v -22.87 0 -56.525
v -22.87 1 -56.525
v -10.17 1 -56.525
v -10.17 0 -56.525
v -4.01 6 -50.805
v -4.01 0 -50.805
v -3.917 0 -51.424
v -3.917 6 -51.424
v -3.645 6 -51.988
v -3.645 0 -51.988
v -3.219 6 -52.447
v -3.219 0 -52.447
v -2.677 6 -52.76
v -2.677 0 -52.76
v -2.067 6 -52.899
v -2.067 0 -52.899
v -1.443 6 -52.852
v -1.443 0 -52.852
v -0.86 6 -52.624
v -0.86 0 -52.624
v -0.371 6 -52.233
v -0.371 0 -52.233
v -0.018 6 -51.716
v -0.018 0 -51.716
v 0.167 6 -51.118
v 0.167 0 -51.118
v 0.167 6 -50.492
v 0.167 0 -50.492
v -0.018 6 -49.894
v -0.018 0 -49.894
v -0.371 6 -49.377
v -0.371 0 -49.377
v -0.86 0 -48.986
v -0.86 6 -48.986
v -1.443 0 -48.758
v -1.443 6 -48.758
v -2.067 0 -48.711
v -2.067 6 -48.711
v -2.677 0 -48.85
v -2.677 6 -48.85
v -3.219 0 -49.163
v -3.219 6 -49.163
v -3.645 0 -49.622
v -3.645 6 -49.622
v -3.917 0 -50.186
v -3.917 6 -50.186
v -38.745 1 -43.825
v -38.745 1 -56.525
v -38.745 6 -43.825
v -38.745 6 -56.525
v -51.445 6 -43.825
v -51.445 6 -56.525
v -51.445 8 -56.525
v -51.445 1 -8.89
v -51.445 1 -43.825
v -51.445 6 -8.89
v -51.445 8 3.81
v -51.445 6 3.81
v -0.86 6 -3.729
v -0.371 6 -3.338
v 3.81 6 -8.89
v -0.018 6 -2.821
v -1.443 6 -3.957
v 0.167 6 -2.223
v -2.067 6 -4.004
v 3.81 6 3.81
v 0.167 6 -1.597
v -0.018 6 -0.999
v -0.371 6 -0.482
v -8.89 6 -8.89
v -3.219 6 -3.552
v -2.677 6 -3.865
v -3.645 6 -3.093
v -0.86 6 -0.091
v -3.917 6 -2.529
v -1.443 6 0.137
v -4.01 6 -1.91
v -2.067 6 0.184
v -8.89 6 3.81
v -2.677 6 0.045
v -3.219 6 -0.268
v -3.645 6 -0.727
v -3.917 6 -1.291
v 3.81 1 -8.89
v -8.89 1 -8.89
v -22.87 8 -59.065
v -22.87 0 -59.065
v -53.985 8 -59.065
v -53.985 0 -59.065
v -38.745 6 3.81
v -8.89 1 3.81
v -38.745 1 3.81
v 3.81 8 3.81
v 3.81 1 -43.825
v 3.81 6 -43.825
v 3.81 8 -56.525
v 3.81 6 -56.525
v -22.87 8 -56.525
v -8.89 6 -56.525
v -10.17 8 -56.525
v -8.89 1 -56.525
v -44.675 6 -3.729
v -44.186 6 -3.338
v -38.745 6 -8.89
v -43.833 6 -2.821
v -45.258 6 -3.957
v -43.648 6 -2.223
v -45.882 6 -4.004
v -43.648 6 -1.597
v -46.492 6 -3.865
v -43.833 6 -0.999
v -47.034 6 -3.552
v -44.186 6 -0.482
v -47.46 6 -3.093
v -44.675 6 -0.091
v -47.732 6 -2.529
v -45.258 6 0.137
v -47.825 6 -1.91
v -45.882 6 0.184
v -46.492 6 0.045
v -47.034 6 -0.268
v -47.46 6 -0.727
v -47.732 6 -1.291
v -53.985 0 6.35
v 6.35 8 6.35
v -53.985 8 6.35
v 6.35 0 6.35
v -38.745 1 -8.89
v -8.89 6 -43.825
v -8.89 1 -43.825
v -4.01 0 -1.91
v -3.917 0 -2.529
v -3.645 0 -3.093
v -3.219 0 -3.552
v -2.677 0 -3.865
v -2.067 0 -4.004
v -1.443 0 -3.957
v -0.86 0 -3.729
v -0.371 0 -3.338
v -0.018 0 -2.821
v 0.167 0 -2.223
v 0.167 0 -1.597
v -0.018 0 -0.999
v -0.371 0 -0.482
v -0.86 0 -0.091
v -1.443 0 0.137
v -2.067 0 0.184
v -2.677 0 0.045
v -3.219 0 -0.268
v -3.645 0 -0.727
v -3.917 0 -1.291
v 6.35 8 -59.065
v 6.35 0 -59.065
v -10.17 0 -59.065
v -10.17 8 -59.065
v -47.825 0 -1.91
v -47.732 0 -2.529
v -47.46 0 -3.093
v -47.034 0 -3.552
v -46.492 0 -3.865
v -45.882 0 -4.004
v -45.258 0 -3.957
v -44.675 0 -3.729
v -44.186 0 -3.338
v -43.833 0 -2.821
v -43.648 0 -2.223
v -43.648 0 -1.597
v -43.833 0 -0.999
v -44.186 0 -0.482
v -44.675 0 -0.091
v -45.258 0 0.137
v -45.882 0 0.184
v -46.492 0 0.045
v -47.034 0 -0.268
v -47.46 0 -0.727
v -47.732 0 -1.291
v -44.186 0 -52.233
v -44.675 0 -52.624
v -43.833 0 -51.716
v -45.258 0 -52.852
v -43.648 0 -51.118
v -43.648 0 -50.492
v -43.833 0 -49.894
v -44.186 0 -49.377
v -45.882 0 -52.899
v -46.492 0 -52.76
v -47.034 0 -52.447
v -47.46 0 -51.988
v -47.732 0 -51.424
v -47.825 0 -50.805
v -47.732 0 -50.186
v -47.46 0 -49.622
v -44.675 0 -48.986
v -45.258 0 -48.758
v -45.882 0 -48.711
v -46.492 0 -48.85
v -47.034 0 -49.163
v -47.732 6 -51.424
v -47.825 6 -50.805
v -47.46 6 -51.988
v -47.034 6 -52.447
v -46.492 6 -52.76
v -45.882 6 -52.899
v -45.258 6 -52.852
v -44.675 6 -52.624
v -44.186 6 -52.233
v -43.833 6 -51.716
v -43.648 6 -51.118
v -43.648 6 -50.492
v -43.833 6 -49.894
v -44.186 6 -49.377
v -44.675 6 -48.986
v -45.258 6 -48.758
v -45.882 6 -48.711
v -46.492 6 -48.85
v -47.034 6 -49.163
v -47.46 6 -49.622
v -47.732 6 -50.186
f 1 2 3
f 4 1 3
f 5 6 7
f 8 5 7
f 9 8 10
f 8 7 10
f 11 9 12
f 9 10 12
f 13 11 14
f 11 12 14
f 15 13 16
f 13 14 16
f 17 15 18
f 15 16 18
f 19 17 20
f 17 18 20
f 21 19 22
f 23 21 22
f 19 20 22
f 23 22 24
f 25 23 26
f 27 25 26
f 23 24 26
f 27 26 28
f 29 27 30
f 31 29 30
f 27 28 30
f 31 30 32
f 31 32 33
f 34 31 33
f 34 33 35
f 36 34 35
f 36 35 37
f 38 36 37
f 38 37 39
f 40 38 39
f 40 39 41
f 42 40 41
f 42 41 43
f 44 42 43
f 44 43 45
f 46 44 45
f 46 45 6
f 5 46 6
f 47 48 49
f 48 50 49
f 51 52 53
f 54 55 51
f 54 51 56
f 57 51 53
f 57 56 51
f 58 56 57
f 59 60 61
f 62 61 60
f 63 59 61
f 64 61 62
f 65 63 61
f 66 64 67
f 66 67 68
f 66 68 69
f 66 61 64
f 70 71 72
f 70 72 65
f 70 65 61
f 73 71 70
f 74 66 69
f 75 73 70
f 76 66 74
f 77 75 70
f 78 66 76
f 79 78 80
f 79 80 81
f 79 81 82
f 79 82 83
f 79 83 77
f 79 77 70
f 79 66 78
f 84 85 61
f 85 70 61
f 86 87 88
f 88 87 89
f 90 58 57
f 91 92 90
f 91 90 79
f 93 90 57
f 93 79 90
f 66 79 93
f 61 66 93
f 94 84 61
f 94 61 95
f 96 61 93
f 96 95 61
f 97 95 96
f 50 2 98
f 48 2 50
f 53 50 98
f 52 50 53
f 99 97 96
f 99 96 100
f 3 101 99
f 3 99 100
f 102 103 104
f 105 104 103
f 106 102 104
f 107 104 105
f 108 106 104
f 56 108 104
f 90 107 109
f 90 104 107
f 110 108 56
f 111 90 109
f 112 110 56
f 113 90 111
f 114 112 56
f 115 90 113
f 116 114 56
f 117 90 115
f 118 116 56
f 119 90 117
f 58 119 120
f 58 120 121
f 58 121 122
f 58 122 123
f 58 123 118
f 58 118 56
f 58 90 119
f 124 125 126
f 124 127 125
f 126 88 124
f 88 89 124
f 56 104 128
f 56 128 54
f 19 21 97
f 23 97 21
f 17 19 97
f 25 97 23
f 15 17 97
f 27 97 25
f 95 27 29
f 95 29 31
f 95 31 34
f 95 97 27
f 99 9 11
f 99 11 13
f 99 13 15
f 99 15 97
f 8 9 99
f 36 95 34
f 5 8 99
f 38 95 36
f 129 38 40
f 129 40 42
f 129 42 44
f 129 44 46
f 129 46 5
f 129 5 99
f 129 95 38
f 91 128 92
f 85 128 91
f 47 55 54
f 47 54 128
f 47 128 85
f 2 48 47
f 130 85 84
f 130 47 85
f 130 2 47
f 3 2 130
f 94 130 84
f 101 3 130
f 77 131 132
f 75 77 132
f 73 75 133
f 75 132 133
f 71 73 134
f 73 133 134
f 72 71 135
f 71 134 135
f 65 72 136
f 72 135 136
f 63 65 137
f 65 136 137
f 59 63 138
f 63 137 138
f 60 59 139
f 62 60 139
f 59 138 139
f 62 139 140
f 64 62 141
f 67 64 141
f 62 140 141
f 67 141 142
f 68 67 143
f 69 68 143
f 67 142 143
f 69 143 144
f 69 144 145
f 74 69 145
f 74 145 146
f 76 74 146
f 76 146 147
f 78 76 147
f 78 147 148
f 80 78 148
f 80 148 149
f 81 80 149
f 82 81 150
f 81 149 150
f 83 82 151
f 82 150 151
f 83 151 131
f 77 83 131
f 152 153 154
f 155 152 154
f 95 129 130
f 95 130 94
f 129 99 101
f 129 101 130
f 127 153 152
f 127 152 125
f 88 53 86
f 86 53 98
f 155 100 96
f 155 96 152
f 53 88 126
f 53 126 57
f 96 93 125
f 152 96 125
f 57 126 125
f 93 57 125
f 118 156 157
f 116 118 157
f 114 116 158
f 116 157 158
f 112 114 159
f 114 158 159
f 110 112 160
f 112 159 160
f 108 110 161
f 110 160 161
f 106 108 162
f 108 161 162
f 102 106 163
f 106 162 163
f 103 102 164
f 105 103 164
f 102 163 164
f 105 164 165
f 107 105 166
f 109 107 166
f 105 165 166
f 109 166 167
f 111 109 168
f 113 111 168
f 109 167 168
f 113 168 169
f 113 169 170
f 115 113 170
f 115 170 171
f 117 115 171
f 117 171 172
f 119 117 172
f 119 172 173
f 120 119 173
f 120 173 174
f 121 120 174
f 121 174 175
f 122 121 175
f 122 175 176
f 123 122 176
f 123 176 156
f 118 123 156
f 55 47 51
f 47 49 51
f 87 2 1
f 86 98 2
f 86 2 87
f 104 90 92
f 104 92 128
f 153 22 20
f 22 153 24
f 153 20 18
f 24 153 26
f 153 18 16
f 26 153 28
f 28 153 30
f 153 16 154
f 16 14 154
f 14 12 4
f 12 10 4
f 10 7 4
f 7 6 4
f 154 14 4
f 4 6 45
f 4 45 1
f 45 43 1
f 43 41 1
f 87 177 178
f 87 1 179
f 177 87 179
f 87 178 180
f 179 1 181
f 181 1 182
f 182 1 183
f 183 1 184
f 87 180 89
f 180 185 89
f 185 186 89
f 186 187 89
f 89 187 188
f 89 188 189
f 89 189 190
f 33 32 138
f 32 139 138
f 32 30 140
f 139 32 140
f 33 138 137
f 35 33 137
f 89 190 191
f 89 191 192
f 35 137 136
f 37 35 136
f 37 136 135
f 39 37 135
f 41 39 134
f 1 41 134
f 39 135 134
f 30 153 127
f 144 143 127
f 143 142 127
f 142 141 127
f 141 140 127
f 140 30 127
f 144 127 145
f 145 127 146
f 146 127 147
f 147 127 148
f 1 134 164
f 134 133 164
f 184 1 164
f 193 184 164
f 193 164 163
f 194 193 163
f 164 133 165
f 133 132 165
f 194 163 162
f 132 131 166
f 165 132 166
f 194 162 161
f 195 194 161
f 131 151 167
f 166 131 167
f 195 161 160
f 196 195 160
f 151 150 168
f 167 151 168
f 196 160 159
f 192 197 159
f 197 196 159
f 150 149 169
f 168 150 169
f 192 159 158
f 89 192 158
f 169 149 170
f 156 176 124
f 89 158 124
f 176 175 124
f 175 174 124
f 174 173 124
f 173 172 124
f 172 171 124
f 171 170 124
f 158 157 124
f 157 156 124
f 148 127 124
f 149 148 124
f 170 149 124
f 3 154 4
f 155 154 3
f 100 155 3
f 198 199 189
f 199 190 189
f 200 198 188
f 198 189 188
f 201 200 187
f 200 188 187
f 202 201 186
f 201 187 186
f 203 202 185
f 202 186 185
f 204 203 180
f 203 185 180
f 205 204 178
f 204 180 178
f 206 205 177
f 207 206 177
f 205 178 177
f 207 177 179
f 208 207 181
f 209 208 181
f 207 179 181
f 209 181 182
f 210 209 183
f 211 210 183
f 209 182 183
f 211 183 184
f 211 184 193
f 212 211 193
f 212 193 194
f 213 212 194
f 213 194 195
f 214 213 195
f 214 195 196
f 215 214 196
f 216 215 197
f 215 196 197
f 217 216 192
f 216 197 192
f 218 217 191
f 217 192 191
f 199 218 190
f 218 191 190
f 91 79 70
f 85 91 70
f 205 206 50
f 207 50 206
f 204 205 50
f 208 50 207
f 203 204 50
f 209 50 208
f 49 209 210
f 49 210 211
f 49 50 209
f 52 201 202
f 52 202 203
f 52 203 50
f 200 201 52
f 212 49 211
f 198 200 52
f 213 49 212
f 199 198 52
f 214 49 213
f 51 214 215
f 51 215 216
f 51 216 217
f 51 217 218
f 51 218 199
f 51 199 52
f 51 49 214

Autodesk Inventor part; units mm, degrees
ref_plane "YZ Plane" through (0, 0, 0) normal (1, 0, 0) x (0, 1, 0)
ref_plane "XZ Plane" through (0, 0, 0) normal (0, 1, 0) x (-1, 0, 0)
ref_plane "XY Plane" through (0, 0, 0) normal (0, 0, 1) x (1, 0, 0)
sketch "Sketch1" plane through (0, 0, 0) normal (0, 1, 0) x (-1, 0, 0)
  line L0 (0, 0) -> (47.635, 0)
  line L1 (47.635, 0) -> (47.635, -52.715)
  line L2 (47.635, -52.715) -> (0, -52.715)
  line L3 (0, -52.715) -> (0, 0)
  circle A0 centre (45.725, -1.91) radius 2.1
  circle A1 centre (45.725, -50.805) radius 2.1
  circle A2 centre (1.91, -1.91) radius 2.1
  circle A3 centre (1.91, -50.805) radius 2.1
  line L4 (47.635, 0) -> (51.445, 0)
  line L5 (51.445, 0) -> (51.445, -52.715)
  line L6 (51.445, -52.715) -> (47.635, -52.715)
  line L7 (47.635, -52.715) -> (47.635, 0)
  line L8 (0, 0) -> (-3.81, 0)
  line L9 (-3.81, 0) -> (-3.81, -56.525)
  line L10 (-3.81, -56.525) -> (0, -56.525)
  line L11 (0, -56.525) -> (0, 0)
  line L12 (51.445, -52.715) -> (-6.35, -52.715)
  line L13 (-6.35, -52.715) -> (-6.35, -56.525)
  line L14 (-6.35, -56.525) -> (51.445, -56.525)
  line L15 (51.445, -56.525) -> (51.445, -52.715)
  line L16 (-3.81, 0) -> (51.445, 0)
  line L17 (51.445, 0) -> (51.445, 3.81)
  line L18 (51.445, 3.81) -> (-3.81, 3.81)
  line L19 (-3.81, 3.81) -> (-3.81, 0)
  point P0 (0, -52.715)
  point P1 (0, -51.6779)
  point P2 (0, -49.9321)
  point P3 (0, -2.7829)
  point P4 (0, -1.0371)
  point P5 (-3.81, -77.675)
  point P6 (-3.81, -52.715)
  point P7 (0, -52.715)
  point P8 (1.0371, -52.715)
  point P9 (2.7829, -52.715)
  point P10 (0, -52.715)
  point P11 (0, -56.525)
  point P12 (0, -56.525)
  dimension "d0" = 52.715
  dimension "d1" = 47.635
  dimension "d3" = 4.2
  dimension "d4" = 4.2
  dimension "d6" = 1.91
  dimension "d7" = 1.91
  dimension "d8" = 1.91
  dimension "d9" = 4.2
  dimension "d10" = 4.2
  dimension "d11" = 1.91
  dimension "d12" = 1.91
  dimension "d13" = 1.91
  dimension "d14" = 1.91
  dimension "d15" = 1.91
  dimension "d18" = 3.81
  dimension "d19" = 3.81
  dimension "d20" = 3.81
  dimension "d21" = 3.81
  dimension "d38" = 0
  dimension "d39" = 0
extrude "Extrusion5" add sketch "Sketch1" along normal blind 6 contours L8 L19 L18 L17 L4 L0 A0 A2 | L0 A2 L3 | L3 A2 A3 L12 L9 L8 | L0 A0 L1 A1 L2 A3 L3 A2 | L12 L11 L10 L9 | L3 A3 L2 | L2 A3 A1 L6 L15 L14 L11 | L0 L1 A0 | A0 L1 L4 L5 L6 A1 | L1 L2 A1 picked at (0.2904, -0.2904) picked at (0.2904, -52.4246) picked at (47.3446, -0.2904) picked at (47.3446, -52.4246)
sketch "Sketch6" plane through (0, 6, 0) normal (0, 1, 0) x (1, 0, 0)
  line L0 (-51.445, -3.81) -> (3.81, -3.81) projected
  line L1 (-51.445, -3.81) -> (-38.745, -3.81)
  line L2 (-38.745, -3.81) -> (-38.745, 8.89)
  line L3 (-38.745, 8.89) -> (-51.445, 8.89)
  line L4 (-51.445, 8.89) -> (-51.445, -3.81)
  line L5 (3.81, 56.525) -> (-51.445, 56.525) projected
  line L6 (-51.445, 56.525) -> (-38.745, 56.525)
  line L7 (-38.745, 56.525) -> (-38.745, 43.825)
  line L8 (-38.745, 43.825) -> (-51.445, 43.825)
  line L9 (-51.445, 43.825) -> (-51.445, 56.525)
  line L10 (3.81, -3.81) -> (3.81, 56.525) projected
  line L11 (3.81, 56.525) -> (-8.89, 56.525)
  line L12 (-8.89, 56.525) -> (-8.89, 43.825)
  line L13 (-8.89, 43.825) -> (3.81, 43.825)
  line L14 (3.81, 43.825) -> (3.81, 56.525)
  line L15 (3.81, -3.81) -> (-8.89, -3.81)
  line L16 (-8.89, -3.81) -> (-8.89, 8.89)
  line L17 (-8.89, 8.89) -> (3.81, 8.89)
  line L18 (3.81, 8.89) -> (3.81, -3.81)
  line L19 (3.81, 56.525) -> (-51.445, 56.525) projected
  line L20 (-51.445, 56.525) -> (-51.445, -3.81) projected
  line L21 (-51.445, -3.81) -> (3.81, -3.81) projected
  line L22 (3.81, -3.81) -> (3.81, 56.525) projected
  circle A0 centre (-1.91, 1.91) radius 2.1 projected
  circle A1 centre (-45.725, 1.91) radius 2.1 projected
  circle A2 centre (-45.725, 50.805) radius 2.1 projected
  circle A3 centre (-1.91, 50.805) radius 2.1 projected
  point P0 (0, 0)
  point P1 (3.81, 8.89)
  dimension "d42" = 12.7
  dimension "d43" = 12.7
  dimension "d44" = 12.7
  dimension "d45" = 12.7
  dimension "d46" = 12.7
  dimension "d47" = 12.7
extrude "Extrusion6" cut sketch "Sketch6" against normal blind 5 contours L2 L3 L20 L8 L7 L5 L12 L13 L10 L17 L16 L0
sketch "Sketch7" plane through (0, 0, 0) normal (0, -1, 0) x (1, 0, 0)
  line L0 (3.81, -56.525) -> (-51.445, -56.525) projected
  line L1 (3.81, 3.81) -> (3.81, -56.525) projected
  line L2 (-51.445, 3.81) -> (3.81, 3.81) projected
  line L3 (-51.445, -56.525) -> (-51.445, 3.81) projected
  circle A0 centre (-1.91, -1.91) radius 2.1 projected
  circle A1 centre (-45.725, -1.91) radius 2.1 projected
  circle A2 centre (-45.725, -50.805) radius 2.1 projected
  circle A3 centre (-1.91, -50.805) radius 2.1 projected
  line L4 (-8.89, 3.81) -> (3.81, 3.81) projected
  line L5 (3.81, 3.81) -> (-51.445, 3.81)
  line L6 (-51.445, 3.81) -> (-51.445, 6.35)
  line L7 (-51.445, 6.35) -> (3.81, 6.35)
  line L8 (3.81, 6.35) -> (3.81, 3.81)
  line L9 (-51.445, 6.35) -> (-53.985, 6.35)
  line L10 (-53.985, 6.35) -> (-53.985, -56.525)
  line L11 (-53.985, -56.525) -> (-51.445, -56.525)
  line L12 (-51.445, -56.525) -> (-51.445, 6.35)
  line L13 (-53.985, -56.525) -> (3.81, -56.525)
  line L14 (3.81, -56.525) -> (3.81, -59.065)
  line L15 (3.81, -59.065) -> (-53.985, -59.065)
  line L16 (-53.985, -59.065) -> (-53.985, -56.525)
  line L17 (3.81, -59.065) -> (6.35, -59.065)
  line L18 (6.35, -59.065) -> (6.35, 5.08)
  line L19 (6.35, 5.08) -> (3.81, 5.08)
  line L20 (3.81, 5.08) -> (3.81, -59.065)
  line L21 (6.35, 5.08) -> (3.81, 5.08)
  line L22 (3.81, 5.08) -> (3.81, 6.35)
  line L23 (3.81, 6.35) -> (6.35, 6.35)
  line L24 (6.35, 6.35) -> (6.35, 5.08)
  point P0 (0, 0)
  dimension "d50" = 2.54
  dimension "d51" = 2.54
  dimension "d52" = 2.54
  dimension "d53" = 2.54
extrude "Extrusion7" add sketch "Sketch7" against normal blind 8 contours L14 L15 L16 L11 L0 | L1 L8 L19 L18 L17 L14 | L11 L10 L9 L6 L3 | L2 L6 L7 L8 | L8 L23 L24 L19
sketch "Sketch8" plane through (0, 8, 0) normal (0, 1, 0) x (1, 0, 0)
  line L0 (-53.985, -6.35) -> (6.35, -6.35) projected
  line L1 (6.35, -6.35) -> (6.35, 59.065) projected
  line L2 (6.35, 59.065) -> (-53.985, 59.065) projected
  line L3 (-53.985, 59.065) -> (-53.985, -6.35) projected
  line L4 (3.81, 56.525) -> (3.81, -3.81) projected
  line L5 (3.81, -3.81) -> (-51.445, -3.81) projected
  line L6 (-51.445, -3.81) -> (-51.445, 56.525) projected
  line L7 (-51.445, 56.525) -> (3.81, 56.525) projected
  circle A0 centre (-1.91, 50.805) radius 2.1 projected
  line L8 (-1.91, 50.805) -> (-10.17, 50.805)
  line L9 (-10.17, 50.805) -> (-10.17, 48.127)
  line L10 (-10.17, 48.127) -> (-1.91, 48.127)
  line L11 (-1.91, 48.127) -> (-1.91, 50.805)
  line L12 (6.35, 59.065) -> (-53.985, 59.065) projected
  line L13 (-10.17, 48.127) -> (-22.87, 48.127)
  line L14 (-22.87, 48.127) -> (-22.87, 59.065)
  line L15 (-22.87, 59.065) -> (-10.17, 59.065)
  line L16 (-10.17, 59.065) -> (-10.17, 48.127)
  point P0 (0, 0)
  point P1 (-10.17, 56.525)
  point P2 (-22.87, 56.525)
  dimension "d56" = 8.26
  dimension "d57" = 12.7
extrude "Extrusion8" cut sketch "Sketch8" against normal blind 8 contours L2 L16 L7 L14
properties part number "PCB_REMOTE_Holder_"
